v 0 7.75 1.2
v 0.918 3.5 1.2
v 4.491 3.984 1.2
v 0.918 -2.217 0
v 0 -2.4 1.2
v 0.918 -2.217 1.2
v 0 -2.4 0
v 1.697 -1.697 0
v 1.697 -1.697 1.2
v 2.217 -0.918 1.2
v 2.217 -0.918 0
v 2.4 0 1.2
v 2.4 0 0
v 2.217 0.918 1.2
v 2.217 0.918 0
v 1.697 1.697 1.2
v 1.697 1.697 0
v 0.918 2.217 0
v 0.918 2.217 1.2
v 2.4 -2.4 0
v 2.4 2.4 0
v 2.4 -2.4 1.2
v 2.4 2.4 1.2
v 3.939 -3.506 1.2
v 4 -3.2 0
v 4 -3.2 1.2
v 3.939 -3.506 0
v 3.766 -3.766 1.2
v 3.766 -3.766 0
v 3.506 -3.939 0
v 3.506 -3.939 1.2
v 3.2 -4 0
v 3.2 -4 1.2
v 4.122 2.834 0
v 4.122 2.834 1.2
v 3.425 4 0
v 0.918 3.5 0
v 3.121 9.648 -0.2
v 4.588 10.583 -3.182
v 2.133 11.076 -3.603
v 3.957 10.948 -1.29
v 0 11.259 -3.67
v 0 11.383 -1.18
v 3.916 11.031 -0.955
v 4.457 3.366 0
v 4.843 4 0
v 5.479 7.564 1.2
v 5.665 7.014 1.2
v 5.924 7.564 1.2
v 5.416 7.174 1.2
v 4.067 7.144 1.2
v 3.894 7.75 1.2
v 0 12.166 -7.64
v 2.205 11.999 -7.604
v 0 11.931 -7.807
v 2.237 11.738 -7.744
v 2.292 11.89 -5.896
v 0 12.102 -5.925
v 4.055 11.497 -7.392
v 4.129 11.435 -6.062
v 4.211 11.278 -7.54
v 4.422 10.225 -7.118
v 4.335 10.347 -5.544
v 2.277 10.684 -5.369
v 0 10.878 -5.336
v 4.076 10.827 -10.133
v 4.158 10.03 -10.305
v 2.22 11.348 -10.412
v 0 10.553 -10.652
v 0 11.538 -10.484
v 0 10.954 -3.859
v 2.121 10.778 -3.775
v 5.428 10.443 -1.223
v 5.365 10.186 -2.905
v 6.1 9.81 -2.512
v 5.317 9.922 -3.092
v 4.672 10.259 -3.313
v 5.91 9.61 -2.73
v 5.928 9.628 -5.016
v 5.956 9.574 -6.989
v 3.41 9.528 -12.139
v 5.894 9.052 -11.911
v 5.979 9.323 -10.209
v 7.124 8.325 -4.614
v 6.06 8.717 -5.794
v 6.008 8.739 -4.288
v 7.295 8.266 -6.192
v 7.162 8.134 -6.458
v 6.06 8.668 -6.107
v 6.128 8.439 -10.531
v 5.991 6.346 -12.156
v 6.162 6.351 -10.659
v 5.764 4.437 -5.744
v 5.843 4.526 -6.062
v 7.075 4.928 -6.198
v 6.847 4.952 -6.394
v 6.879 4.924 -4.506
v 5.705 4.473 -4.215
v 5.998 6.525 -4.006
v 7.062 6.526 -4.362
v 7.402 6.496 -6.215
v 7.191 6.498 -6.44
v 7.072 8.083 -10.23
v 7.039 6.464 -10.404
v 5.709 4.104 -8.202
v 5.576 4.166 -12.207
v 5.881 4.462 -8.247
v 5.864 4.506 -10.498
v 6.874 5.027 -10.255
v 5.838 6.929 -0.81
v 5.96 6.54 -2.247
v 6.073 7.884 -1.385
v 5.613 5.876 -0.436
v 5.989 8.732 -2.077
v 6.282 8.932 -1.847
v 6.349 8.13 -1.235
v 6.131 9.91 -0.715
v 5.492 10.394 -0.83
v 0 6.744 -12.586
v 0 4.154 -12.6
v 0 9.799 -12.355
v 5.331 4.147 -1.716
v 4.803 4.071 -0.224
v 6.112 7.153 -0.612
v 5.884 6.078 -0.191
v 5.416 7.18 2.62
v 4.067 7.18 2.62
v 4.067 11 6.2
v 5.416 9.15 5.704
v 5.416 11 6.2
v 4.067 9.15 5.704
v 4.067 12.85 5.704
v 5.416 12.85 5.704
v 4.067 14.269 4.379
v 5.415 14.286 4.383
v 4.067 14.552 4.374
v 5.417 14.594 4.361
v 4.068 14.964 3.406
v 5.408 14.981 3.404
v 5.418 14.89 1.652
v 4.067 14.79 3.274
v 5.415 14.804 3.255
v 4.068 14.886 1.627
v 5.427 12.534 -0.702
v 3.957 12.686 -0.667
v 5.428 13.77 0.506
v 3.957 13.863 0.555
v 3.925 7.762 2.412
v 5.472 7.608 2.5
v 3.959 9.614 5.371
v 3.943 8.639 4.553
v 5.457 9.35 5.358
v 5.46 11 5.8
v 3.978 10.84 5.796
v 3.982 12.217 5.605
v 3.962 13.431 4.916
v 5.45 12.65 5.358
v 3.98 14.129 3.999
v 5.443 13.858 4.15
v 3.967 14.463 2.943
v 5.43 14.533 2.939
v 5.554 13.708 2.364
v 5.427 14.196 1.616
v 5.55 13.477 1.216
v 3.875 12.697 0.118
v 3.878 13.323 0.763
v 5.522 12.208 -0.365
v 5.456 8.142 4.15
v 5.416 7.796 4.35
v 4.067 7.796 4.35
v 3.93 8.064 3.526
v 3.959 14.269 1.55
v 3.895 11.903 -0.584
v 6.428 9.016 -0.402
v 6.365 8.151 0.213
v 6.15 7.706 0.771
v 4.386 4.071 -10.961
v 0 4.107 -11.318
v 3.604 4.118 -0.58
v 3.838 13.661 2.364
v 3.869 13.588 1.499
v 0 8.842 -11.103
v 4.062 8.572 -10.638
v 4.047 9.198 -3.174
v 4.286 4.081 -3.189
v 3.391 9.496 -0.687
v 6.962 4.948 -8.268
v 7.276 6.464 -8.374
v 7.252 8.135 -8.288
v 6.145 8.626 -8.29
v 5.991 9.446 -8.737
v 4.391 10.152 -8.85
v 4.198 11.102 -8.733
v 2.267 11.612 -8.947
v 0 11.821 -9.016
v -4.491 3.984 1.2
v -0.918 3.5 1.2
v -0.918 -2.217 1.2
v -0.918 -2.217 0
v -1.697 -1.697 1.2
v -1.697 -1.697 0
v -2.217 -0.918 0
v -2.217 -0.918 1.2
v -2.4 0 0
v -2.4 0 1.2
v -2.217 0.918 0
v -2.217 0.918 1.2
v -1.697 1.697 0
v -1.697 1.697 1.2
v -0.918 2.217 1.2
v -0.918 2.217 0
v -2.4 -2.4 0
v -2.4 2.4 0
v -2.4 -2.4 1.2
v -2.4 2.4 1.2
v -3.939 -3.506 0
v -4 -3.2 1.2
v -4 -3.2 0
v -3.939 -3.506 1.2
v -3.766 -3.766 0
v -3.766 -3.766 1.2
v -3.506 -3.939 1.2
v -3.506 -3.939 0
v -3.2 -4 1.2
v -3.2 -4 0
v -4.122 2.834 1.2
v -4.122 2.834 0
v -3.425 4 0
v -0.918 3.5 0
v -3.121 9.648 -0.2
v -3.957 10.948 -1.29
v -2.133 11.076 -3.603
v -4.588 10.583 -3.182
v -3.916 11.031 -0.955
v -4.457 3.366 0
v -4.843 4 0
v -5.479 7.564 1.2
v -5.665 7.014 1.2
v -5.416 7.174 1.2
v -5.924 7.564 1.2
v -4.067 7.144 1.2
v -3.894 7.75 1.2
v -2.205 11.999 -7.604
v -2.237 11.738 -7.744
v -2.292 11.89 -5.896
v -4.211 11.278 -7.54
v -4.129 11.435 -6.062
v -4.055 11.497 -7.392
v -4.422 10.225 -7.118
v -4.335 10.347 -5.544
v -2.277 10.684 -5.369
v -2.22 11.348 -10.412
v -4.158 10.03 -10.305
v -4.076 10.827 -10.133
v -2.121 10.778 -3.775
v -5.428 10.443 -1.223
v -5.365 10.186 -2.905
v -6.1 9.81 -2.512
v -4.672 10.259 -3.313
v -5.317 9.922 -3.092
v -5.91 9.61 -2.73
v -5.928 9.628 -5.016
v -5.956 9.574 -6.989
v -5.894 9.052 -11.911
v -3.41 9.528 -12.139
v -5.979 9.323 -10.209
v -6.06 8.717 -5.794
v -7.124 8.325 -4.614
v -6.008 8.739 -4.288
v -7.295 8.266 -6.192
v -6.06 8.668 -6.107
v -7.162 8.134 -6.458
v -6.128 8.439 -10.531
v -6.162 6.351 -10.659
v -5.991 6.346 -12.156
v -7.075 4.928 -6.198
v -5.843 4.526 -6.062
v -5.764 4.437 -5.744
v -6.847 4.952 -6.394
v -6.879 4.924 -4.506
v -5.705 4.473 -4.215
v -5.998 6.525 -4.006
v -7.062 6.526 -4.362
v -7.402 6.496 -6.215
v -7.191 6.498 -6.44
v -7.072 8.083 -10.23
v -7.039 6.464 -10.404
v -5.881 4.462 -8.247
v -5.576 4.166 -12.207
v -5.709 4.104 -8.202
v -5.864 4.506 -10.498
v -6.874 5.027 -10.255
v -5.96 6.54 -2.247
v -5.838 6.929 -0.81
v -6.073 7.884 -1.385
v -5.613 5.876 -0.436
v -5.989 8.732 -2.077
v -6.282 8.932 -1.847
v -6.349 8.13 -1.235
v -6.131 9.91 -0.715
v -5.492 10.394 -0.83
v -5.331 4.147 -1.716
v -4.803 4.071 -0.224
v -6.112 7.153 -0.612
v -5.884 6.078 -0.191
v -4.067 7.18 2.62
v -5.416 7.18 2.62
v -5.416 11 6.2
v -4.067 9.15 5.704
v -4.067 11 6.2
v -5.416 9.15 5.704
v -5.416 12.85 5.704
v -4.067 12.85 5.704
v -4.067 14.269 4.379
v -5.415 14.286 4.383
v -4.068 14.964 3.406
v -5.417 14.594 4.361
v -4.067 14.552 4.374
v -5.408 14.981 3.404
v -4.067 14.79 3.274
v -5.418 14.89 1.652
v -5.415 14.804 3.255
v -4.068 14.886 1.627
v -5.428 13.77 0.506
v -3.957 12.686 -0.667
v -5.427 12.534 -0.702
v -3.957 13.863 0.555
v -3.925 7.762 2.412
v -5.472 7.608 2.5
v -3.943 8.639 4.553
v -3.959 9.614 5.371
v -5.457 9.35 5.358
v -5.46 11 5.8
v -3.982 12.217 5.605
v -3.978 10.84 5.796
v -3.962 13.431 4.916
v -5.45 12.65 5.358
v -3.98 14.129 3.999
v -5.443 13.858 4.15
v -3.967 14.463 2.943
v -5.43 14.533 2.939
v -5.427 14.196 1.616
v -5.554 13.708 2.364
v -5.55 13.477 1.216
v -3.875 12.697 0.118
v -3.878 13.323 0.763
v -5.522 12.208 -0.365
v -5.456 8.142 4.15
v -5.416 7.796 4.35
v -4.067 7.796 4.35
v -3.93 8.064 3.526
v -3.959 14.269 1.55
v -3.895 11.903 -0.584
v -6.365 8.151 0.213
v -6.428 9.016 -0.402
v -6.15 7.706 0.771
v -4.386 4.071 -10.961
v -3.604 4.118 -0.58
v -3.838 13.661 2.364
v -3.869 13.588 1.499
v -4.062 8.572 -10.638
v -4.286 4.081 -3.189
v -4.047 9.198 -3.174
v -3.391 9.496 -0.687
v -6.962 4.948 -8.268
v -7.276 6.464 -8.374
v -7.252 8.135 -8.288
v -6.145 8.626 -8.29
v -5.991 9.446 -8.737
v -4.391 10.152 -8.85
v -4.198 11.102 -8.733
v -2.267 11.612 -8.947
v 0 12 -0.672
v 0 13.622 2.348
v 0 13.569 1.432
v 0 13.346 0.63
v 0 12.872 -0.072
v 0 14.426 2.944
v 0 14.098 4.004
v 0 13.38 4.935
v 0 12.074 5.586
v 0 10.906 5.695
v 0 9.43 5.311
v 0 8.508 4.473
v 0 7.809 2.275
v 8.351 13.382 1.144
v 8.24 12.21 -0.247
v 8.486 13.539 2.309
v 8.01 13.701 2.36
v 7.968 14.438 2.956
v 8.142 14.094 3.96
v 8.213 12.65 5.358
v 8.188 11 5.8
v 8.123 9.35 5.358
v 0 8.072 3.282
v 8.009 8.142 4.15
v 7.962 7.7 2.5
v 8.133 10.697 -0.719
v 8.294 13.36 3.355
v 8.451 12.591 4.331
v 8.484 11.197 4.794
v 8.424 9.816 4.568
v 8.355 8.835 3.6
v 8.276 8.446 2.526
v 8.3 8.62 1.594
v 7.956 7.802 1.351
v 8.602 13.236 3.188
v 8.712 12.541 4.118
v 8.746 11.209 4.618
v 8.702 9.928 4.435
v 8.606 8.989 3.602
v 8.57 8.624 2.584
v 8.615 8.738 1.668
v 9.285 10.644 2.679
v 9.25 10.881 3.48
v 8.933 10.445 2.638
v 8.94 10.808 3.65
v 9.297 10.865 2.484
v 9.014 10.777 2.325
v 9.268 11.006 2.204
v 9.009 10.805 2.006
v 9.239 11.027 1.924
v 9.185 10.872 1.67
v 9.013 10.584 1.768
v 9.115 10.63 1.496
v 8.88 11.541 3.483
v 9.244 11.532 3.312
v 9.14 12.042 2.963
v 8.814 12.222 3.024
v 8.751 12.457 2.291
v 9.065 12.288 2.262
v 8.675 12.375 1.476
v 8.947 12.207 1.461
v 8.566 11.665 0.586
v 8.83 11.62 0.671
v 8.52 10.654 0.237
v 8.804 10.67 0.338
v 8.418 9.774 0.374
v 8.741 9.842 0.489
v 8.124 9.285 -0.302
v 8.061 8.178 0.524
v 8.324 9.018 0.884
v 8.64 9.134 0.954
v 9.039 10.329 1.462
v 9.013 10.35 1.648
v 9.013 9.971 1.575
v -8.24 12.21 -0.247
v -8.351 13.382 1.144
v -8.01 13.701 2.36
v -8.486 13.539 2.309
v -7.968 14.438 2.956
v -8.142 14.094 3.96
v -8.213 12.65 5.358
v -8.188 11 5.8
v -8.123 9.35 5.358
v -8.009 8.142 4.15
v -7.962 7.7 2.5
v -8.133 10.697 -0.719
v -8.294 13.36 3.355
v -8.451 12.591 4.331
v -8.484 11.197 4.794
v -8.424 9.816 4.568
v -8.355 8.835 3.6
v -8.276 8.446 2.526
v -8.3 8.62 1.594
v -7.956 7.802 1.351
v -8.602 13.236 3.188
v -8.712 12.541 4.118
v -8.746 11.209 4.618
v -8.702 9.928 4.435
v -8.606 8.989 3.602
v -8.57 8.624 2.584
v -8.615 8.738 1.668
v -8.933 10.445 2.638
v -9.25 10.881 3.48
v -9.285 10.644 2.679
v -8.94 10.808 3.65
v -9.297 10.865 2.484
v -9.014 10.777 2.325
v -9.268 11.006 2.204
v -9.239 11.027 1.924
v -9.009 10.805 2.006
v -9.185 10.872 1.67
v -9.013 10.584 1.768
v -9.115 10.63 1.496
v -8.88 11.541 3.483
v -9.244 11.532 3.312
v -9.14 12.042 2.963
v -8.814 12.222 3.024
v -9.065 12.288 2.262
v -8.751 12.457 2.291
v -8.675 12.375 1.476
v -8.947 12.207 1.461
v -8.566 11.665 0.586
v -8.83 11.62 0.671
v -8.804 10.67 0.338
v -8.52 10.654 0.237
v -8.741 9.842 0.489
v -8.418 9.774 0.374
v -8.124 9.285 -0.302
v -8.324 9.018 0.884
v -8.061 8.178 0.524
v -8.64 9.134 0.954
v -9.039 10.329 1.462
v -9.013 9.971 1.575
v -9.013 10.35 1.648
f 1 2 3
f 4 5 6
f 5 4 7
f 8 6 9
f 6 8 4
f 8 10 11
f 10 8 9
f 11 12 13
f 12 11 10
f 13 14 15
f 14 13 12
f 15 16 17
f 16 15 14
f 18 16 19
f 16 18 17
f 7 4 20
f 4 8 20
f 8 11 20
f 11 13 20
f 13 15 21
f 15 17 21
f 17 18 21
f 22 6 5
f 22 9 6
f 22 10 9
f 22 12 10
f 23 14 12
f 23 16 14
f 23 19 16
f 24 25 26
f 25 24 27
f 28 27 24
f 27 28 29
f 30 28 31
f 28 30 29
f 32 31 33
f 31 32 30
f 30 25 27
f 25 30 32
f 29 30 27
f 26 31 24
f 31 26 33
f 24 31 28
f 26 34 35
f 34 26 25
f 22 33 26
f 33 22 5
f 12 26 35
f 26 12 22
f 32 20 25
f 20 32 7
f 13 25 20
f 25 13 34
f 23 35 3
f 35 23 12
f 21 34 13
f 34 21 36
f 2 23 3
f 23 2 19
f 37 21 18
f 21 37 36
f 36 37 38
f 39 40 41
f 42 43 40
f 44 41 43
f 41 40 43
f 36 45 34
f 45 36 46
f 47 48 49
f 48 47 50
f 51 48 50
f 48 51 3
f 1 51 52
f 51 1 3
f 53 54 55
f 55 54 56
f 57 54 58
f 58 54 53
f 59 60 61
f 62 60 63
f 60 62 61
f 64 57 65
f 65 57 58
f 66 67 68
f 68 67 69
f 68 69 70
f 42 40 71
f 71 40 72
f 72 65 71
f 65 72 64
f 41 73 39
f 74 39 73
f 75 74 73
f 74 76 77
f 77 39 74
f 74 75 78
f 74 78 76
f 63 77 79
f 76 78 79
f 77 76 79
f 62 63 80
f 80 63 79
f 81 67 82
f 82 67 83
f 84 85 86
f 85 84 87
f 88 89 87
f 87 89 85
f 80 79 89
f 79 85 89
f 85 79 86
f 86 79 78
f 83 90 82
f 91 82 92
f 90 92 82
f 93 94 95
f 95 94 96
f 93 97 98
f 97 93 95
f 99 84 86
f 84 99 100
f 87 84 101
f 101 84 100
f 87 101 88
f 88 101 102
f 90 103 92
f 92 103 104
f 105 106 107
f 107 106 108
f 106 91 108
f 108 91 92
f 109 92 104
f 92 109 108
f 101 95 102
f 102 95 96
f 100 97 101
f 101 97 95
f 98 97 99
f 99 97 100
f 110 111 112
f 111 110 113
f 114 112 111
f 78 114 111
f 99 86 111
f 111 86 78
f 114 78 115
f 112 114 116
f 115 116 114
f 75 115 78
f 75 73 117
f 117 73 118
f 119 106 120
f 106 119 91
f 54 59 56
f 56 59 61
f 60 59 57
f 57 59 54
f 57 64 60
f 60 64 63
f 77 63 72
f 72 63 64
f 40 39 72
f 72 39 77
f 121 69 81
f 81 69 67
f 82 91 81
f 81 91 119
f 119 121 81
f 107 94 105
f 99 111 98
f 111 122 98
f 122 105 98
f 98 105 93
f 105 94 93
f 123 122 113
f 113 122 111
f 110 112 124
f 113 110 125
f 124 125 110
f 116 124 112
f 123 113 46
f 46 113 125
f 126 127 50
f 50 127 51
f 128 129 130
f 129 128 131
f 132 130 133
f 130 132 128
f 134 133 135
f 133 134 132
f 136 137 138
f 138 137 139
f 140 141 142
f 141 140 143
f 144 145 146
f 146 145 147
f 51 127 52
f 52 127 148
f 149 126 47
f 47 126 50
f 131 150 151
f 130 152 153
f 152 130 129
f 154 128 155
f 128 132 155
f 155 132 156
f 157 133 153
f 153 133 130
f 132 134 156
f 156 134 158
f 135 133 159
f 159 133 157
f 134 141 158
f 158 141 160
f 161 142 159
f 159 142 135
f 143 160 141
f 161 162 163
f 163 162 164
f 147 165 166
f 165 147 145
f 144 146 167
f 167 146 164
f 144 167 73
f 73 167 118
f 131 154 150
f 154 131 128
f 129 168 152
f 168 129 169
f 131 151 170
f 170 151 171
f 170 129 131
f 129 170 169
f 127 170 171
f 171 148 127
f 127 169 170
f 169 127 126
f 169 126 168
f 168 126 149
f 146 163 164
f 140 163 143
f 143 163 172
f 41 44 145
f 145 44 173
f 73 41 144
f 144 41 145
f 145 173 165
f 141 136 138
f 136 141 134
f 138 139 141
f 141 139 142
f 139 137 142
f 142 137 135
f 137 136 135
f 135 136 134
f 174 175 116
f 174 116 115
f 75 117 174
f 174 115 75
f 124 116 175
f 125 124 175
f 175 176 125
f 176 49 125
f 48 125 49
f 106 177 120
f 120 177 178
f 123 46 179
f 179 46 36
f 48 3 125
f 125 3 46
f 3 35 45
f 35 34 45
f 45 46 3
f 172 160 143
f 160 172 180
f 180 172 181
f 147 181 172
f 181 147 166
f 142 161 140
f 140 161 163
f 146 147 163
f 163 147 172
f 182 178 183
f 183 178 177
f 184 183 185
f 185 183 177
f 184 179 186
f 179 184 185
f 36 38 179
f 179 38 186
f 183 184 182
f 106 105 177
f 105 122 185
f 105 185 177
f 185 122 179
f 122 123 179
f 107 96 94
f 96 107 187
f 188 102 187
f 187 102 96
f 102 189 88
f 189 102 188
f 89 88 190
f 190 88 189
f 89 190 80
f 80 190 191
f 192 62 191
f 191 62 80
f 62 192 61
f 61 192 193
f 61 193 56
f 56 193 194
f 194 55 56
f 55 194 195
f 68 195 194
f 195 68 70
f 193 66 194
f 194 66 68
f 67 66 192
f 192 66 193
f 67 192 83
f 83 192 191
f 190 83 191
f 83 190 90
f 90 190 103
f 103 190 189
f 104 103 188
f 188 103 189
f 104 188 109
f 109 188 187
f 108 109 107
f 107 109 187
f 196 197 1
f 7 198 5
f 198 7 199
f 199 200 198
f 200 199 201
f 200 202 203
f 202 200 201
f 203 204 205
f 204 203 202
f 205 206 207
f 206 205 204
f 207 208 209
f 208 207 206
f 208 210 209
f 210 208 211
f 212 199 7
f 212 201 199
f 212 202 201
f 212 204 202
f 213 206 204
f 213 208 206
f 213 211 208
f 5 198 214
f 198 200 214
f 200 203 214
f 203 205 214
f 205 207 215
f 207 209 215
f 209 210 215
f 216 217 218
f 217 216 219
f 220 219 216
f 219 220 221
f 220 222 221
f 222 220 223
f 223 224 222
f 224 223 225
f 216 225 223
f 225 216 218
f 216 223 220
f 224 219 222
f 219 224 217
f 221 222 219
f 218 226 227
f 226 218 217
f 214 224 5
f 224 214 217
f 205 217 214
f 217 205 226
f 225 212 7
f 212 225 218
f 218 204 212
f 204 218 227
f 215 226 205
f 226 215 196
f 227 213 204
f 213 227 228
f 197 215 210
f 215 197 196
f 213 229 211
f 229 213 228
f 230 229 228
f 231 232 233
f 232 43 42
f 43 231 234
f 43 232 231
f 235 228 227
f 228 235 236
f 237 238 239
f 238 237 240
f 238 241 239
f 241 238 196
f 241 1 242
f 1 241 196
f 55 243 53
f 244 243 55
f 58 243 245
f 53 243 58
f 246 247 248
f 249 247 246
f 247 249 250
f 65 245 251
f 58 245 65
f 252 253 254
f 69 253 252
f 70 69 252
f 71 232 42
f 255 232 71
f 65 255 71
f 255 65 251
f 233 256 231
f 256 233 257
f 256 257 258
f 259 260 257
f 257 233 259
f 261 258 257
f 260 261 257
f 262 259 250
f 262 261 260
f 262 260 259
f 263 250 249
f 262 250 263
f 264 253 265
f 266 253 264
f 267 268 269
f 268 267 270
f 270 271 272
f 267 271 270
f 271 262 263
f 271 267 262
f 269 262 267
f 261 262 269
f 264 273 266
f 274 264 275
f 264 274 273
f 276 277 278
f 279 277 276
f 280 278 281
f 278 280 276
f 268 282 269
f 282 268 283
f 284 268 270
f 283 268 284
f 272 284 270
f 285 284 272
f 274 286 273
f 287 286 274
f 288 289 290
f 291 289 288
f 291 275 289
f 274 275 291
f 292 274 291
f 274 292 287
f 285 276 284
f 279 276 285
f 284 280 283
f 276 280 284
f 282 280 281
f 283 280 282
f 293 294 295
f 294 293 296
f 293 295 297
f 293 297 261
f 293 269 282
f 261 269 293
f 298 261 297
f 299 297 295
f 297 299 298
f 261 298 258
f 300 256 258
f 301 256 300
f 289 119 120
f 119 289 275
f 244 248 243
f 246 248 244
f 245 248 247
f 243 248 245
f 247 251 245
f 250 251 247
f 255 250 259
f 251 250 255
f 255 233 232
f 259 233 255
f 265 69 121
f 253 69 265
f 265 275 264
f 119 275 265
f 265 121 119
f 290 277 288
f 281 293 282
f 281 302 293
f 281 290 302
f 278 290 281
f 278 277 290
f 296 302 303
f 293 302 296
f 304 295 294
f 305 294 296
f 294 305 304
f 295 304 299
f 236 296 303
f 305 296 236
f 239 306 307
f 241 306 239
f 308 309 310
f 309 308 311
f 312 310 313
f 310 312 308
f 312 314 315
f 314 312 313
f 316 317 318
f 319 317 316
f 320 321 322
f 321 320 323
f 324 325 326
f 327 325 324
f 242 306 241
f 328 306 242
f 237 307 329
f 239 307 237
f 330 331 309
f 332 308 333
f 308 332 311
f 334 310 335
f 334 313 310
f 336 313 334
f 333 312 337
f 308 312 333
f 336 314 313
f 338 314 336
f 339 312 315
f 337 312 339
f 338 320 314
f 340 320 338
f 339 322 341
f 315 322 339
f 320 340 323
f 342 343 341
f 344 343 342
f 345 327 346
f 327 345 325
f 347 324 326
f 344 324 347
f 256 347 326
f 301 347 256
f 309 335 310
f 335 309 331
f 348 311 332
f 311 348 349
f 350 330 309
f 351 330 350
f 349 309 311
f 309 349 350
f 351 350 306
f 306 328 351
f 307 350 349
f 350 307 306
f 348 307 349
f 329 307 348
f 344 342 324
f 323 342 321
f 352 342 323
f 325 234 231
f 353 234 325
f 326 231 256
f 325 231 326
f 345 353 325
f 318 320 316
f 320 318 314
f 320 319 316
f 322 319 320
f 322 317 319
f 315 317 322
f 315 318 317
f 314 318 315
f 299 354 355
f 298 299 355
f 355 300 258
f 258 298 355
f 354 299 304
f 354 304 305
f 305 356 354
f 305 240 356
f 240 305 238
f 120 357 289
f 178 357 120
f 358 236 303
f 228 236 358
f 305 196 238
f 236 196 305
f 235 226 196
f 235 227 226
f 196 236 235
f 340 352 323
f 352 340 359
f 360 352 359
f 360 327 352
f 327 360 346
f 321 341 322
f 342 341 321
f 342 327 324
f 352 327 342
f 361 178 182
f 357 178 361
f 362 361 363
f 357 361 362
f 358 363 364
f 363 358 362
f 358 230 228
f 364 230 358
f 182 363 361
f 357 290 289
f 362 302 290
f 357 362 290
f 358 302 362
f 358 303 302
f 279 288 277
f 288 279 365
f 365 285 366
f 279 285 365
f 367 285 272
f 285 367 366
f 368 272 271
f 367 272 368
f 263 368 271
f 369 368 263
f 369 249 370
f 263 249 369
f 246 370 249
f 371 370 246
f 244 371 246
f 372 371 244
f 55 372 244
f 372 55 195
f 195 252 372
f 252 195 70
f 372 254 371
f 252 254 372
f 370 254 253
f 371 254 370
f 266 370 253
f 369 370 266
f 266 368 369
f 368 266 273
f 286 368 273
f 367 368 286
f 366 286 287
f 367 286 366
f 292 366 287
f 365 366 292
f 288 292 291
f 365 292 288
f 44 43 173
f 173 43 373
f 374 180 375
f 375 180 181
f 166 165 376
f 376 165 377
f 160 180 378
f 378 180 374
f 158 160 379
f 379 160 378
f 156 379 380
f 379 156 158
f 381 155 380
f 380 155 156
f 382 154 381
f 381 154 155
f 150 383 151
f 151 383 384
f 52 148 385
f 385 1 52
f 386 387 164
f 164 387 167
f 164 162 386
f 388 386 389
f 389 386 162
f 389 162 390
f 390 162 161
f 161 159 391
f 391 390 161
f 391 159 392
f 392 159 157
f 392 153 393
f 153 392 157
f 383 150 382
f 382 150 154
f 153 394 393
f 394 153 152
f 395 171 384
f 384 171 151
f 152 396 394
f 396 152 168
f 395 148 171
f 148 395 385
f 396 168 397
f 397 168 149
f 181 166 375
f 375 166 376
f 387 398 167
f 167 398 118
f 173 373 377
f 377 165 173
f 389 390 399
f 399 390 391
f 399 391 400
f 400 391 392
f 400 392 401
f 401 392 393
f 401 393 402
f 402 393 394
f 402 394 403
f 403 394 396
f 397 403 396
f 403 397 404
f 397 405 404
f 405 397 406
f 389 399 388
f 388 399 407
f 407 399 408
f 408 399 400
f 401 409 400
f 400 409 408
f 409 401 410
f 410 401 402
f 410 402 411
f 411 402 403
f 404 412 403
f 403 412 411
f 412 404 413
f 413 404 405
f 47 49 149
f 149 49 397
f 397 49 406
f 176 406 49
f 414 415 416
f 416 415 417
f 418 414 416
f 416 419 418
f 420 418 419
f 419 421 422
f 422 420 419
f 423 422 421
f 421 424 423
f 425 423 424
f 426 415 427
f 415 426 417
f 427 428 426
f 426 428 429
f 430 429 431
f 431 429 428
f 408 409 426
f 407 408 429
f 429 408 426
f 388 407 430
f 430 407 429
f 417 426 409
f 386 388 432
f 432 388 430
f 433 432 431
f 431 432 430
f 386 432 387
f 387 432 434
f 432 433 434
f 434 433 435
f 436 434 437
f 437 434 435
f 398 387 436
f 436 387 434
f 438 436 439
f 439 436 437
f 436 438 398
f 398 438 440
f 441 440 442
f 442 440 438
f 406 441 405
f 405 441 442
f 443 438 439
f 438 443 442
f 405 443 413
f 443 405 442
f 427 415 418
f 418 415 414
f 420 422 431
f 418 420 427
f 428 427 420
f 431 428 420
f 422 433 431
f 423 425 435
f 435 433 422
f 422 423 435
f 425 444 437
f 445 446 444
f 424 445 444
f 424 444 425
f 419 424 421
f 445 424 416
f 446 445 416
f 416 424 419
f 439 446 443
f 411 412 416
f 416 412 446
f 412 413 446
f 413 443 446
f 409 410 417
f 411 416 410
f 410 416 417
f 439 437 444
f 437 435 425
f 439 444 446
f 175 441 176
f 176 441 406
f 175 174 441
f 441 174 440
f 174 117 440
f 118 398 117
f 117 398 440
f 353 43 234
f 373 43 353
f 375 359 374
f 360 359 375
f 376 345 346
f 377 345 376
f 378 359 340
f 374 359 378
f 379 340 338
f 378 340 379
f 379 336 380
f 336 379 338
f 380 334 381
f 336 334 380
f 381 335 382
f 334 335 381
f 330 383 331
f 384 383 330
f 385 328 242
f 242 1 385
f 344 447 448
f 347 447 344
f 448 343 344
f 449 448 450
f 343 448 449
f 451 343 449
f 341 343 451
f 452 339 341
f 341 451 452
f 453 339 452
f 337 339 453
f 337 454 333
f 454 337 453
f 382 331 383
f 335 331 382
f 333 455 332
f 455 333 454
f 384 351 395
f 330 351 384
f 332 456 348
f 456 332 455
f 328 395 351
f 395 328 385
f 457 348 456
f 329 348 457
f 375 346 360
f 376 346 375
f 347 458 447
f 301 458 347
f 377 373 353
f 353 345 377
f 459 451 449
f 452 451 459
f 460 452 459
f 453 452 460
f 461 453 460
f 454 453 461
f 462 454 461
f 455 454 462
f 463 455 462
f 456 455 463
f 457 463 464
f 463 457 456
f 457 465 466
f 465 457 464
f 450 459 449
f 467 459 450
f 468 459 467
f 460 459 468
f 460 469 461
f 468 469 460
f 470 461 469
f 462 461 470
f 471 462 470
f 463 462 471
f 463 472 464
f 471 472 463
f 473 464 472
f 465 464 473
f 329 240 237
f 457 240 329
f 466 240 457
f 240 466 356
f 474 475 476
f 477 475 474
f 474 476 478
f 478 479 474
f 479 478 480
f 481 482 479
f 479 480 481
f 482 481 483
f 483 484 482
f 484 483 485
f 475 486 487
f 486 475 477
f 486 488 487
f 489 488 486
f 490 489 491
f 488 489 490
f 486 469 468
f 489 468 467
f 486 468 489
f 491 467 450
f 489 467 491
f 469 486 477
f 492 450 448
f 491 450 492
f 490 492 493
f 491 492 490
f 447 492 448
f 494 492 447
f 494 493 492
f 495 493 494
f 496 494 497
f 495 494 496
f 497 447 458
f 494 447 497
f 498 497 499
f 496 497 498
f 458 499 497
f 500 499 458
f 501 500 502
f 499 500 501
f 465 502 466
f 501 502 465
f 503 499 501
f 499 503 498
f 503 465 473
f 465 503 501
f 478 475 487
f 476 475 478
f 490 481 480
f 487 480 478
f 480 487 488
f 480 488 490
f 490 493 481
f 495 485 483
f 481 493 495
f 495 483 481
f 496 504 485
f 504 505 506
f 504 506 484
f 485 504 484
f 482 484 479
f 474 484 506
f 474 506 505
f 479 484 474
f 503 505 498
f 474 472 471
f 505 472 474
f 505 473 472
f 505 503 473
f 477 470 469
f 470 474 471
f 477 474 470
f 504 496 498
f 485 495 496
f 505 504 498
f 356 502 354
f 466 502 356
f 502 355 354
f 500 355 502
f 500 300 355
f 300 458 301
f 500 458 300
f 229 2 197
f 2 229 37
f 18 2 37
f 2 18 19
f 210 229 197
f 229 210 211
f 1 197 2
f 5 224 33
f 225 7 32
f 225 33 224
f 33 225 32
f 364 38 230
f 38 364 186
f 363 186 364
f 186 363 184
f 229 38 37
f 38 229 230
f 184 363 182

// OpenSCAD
use <../lib.scad>
use <../p/box3u2p.scad>
use <../p/rect2p.scad>
use <s/26073s01.scad>
use <s/26073s02.scad>
function ldraw_lib__26073p01() = [
// 0 Minifig Backpack with Three Pouches and Red Bedroll Pattern
// 0 Name: 26073p01.dat
// 0 Author: Gerald Lasser [GeraldLasser]
// 0 !LDRAW_ORG Part UPDATE 2022-04
// 0 !LICENSE Licensed under CC BY 4.0 : see CAreadme.txt
// 
// 0 BFC CERTIFY CCW
  [0,"BFC","CERTIFY"],
  [0,"BFC","CCW"],
// 
// 0 !CATEGORY Minifig Neckwear
// 0 !KEYWORDS BrickLink 26073pb02, Rebrickable 26073pr0002, Set 71019-10
// 
// 0 !HISTORY 2022-07-18 [PTadmin] Official Update 2022-04
// 
// 
// 1 16 0 0 0 1 0 0 0 1 0 0 0 1 s\26073s01.dat
  [1,16,0,0,0,1,0,0,0,1,0,0,0,1, ldraw_lib__s__26073s01()],
// 1 16 0 0 0 -1 0 0 0 1 0 0 0 1 s\26073s01.dat
  [1,16,0,0,0,-1,0,0,0,1,0,0,0,1, ldraw_lib__s__26073s01()],
// 1 4 0 0 0 1 0 0 0 1 0 0 0 1 s\26073s02.dat
  [1,4,0,0,0,1,0,0,0,1,0,0,0,1, ldraw_lib__s__26073s02()],
// 1 4 0 0 0 -1 0 0 0 1 0 0 0 1 s\26073s02.dat
  [1,4,0,0,0,-1,0,0,0,1,0,0,0,1, ldraw_lib__s__26073s02()],
// 
// 0 BFC INVERTNEXT
  [0,"BFC","INVERTNEXT"],
// 1 16 0 -1.5 5.5434 0 0 2.2962 1.5 0 0 0 3.2066 0 box3u2p.dat
  [1,16,0,-1.5,5.5434,0,0,2.2962,1.5,0,0,0,3.2066,0, ldraw_lib__box3u2p()],
// 3 16 0 -3 19.374 -2.2962 -3 8.75 2.2962 -3 8.75
  [3,16,0,-3,19.374,-2.2962,-3,8.75,2.2962,-3,8.75],
// 3 16 0 -3 -6 -8 -3 -10 8 -3 -10
  [3,16,0,-3,-6,-8,-3,-10,8,-3,-10],
// 3 16 -8 0 -10 0 0 -6 8 0 -10
  [3,16,-8,0,-10,0,0,-6,8,0,-10],
// 1 16 0 -1.5 -10 -8 0 0 0 0 1.5 0 1 0 rect2p.dat
  [1,16,0,-1.5,-10,-8,0,0,0,0,1.5,0,1,0, ldraw_lib__rect2p()],
// 2 24 7.802 .499 24.119 -7.802 .499 24.119
  [2,24,7.802,.499,24.119,-7.802,.499,24.119],
// 
// 4 16 7.802 .499 24.119 -7.802 .499 24.119 -8.477 1.717 23.739 8.477 1.717 23.739
  [4,16,7.802,.499,24.119,-7.802,.499,24.119,-8.477,1.717,23.739,8.477,1.717,23.739],
// 4 16 10.117 7.934 22.995 8.477 1.717 23.739 -8.477 1.717 23.739 -10.117 7.934 22.995
  [4,16,10.117,7.934,22.995,8.477,1.717,23.739,-8.477,1.717,23.739,-10.117,7.934,22.995],
// 4 16 2.2962 0 8.75 -2.2962 0 8.75 -7.802 .499 24.119 7.802 .499 24.119
  [4,16,2.2962,0,8.75,-2.2962,0,8.75,-7.802,.499,24.119,7.802,.499,24.119],
// 3 16 10.117 7.934 22.995 -10.117 7.934 22.995 0 27.758 22.106
  [3,16,10.117,7.934,22.995,-10.117,7.934,22.995,0,27.758,22.106],
// 5 24 8.477 1.717 23.739 -8.477 1.717 23.739 7.802 .499 24.119 10.117 7.934 22.995
  [5,24,8.477,1.717,23.739,-8.477,1.717,23.739,7.802,.499,24.119,10.117,7.934,22.995],
// 5 24 -10.117 7.934 22.995 10.117 7.934 22.995 8.477 1.717 23.739 10.156 26.595 21.431
  [5,24,-10.117,7.934,22.995,10.117,7.934,22.995,8.477,1.717,23.739,10.156,26.595,21.431],
// 5 24 10.117 7.934 22.995 0 27.758 22.106 10.156 26.595 21.431 -10.117 7.934 22.995
  [5,24,10.117,7.934,22.995,0,27.758,22.106,10.156,26.595,21.431,-10.117,7.934,22.995],
// 5 24 0 27.758 22.106 -10.117 7.934 22.995 10.117 7.934 22.995 -10.156 26.595 21.431
  [5,24,0,27.758,22.106,-10.117,7.934,22.995,10.117,7.934,22.995,-10.156,26.595,21.431],
// 
// 0 // Seam
// 5 24 0 31.466 16.86 0 31.501 10.384 -14.977 30.389 15.864 13.94 30.517 10.414
  [5,24,0,31.466,16.86,0,31.501,10.384,-14.977,30.389,15.864,13.94,30.517,10.414],
// 5 24 0 30.888 24.497 0 31.466 16.86 8.525 30.348 23.819 -8.525 30.348 23.819
  [5,24,0,30.888,24.497,0,31.466,16.86,8.525,30.348,23.819,-8.525,30.348,23.819],
// 5 24 0 26.629 26.383 0 30.888 24.497 8.525 30.348 23.819 -8.525 30.348 23.819
  [5,24,0,26.629,26.383,0,30.888,24.497,8.525,30.348,23.819,-8.525,30.348,23.819],
// 5 24 0 26.629 26.383 0 26.211 28.844 5.549 26.03 28.371 -5.549 26.03 28.371
  [5,24,0,26.629,26.383,0,26.211,28.844,5.549,26.03,28.371,-5.549,26.03,28.371],
// 5 24 0 22.541 29.553 0 26.211 28.844 -5.667 22.367 29.03 5.549 26.03 28.371
  [5,24,0,22.541,29.553,0,26.211,28.844,-5.667,22.367,29.03,5.549,26.03,28.371],
// 5 24 0 22.541 29.553 0 19.518 29.827 -5.667 22.367 29.03 5.592 19.361 29.344
  [5,24,0,22.541,29.553,0,19.518,29.827,-5.667,22.367,29.03,5.592,19.361,29.344],
// 5 24 0 19.518 29.827 0 19.101 30.416 -5.512 19.01 29.997 5.512 19.01 29.997
  [5,24,0,19.518,29.827,0,19.101,30.416,-5.512,19.01,29.997,5.512,19.01,29.997],
// 5 24 0 14.812 30.254 0 19.101 30.416 5.512 19.01 29.997 -5.512 19.01 29.997
  [5,24,0,14.812,30.254,0,19.101,30.416,5.512,19.01,29.997,-5.512,19.01,29.997],
// 5 24 0 13.34 27.194 0 14.812 30.254 5.731 14.739 29.726 -5.731 14.739 29.726
  [5,24,0,13.34,27.194,0,14.812,30.254,5.731,14.739,29.726,-5.731,14.739,29.726],
// 5 24 0 13.34 27.194 0 9.647 27.386 5.303 9.437 26.946 -5.693 13.422 26.709
  [5,24,0,13.34,27.194,0,9.647,27.386,5.303,9.437,26.946,-5.693,13.422,26.709],
// 5 24 0 9.647 27.386 0 9.174 28.147 5.332 9.008 27.69 -5.332 9.008 27.69
  [5,24,0,9.647,27.386,0,9.174,28.147,5.332,9.008,27.69,-5.332,9.008,27.69],
// 5 24 0 9.174 28.147 0 2.95 28.458 -5.332 9.008 27.69 5.332 9.008 27.69
  [5,24,0,9.174,28.147,0,2.95,28.458,-5.332,9.008,27.69,5.332,9.008,27.69],
// 5 24 0 1.68 29.999 0 2.95 28.458 -9.738 1.231 29.578 9.738 1.231 29.578
  [5,24,0,1.68,29.999,0,2.95,28.458,-9.738,1.231,29.578,9.738,1.231,29.578],
// 5 24 0 .179 32.18 0 1.68 29.999 9.687 -.296 31.742 -9.738 1.231 29.578
  [5,24,0,.179,32.18,0,1.68,29.999,9.687,-.296,31.742,-9.738,1.231,29.578],
// 5 24 0 -1.576 33.365 0 .179 32.18 9.687 -.296 31.742 -9.687 -.296 31.742
  [5,24,0,-1.576,33.365,0,.179,32.18,9.687,-.296,31.742,-9.687,-.296,31.742],
// 5 24 0 -3.579 33.922 0 -1.576 33.365 9.696 -1.907 33.307 -9.696 -1.907 33.307
  [5,24,0,-3.579,33.922,0,-1.576,33.365,9.696,-1.907,33.307,-9.696,-1.907,33.307],
// 5 24 0 -3.579 33.922 0 -5.871 34.055 9.594 -5.911 34.153 -9.594 -5.911 34.153
  [5,24,0,-3.579,33.922,0,-5.871,34.055,9.594,-5.911,34.153,-9.594,-5.911,34.153],
// 5 24 0 -5.871 34.055 0 -7.36 36.065 9.594 -5.911 34.153 -9.594 -5.911 34.153
  [5,24,0,-5.871,34.055,0,-7.36,36.065,9.594,-5.911,34.153,-9.594,-5.911,34.153],
// 5 24 0 -10.009 35.245 0 -7.36 36.065 9.918 -7.358 36.157 -9.918 -7.358 36.157
  [5,24,0,-10.009,35.245,0,-7.36,36.065,9.918,-7.358,36.157,-9.918,-7.358,36.157],
// 5 24 0 -12.337 33.451 0 -10.009 35.245 9.904 -12.291 33.578 -9.95 -9.997 35.323
  [5,24,0,-12.337,33.451,0,-10.009,35.245,9.904,-12.291,33.578,-9.95,-9.997,35.323],
// 5 24 0 -13.966 30.184 0 -12.337 33.451 9.956 -14.012 30.543 -9.956 -14.012 30.543
  [5,24,0,-13.966,30.184,0,-12.337,33.451,9.956,-14.012,30.543,-9.956,-14.012,30.543],
// 5 24 0 -14.238 27.264 0 -13.966 30.184 -9.946 -14.489 27.1 9.946 -14.489 27.1
  [5,24,0,-14.238,27.264,0,-13.966,30.184,-9.946,-14.489,27.1,9.946,-14.489,27.1],
// 5 24 0 -5.688 19.523 0 -3 19.374 -9.812 -6.029 19.404 9.735 -3 19.374
  [5,24,0,-5.688,19.523,0,-3,19.374,-9.812,-6.029,19.404,9.735,-3,19.374],
// 5 24 0 -5.688 19.523 0 -8.205 20.18 -9.825 -8.814 20.16 9.812 -6.029 19.404
  [5,24,0,-5.688,19.523,0,-8.205,20.18,-9.825,-8.814,20.16,9.812,-6.029,19.404],
// 5 24 0 -8.205 20.18 0 -11.183 21.269 -9.825 -8.814 20.16 9.825 -8.814 20.16
  [5,24,0,-8.205,20.18,0,-11.183,21.269,-9.825,-8.814,20.16,9.825,-8.814,20.16],
// 5 24 0 -11.183 21.269 0 -13.278 23.574 -9.857 -11.382 21.598 9.857 -11.382 21.598
  [5,24,0,-11.183,21.269,0,-13.278,23.574,-9.857,-11.382,21.598,9.857,-11.382,21.598],
// 5 24 0 -13.278 23.574 0 -14.238 27.264 9.897 -13.428 24.034 -9.897 -13.428 24.034
  [5,24,0,-13.278,23.574,0,-14.238,27.264,9.897,-13.428,24.034,-9.897,-13.428,24.034],
// 5 24 0 28.295 10.267 0 31.501 10.384 10.966 27.403 10.178 -10.966 27.403 10.178
  [5,24,0,28.295,10.267,0,31.501,10.384,10.966,27.403,10.178,-10.966,27.403,10.178],
// 5 24 0 27.758 22.106 0 28.295 10.267 -10.156 26.595 21.431 10.156 26.595 21.431
  [5,24,0,27.758,22.106,0,28.295,10.267,-10.156,26.595,21.431,10.156,26.595,21.431],
// 
// 5 24 -7.802 .499 24.119 -2.2962 0 8.75 -8.563 0 10 7.802 .499 24.119
  [5,24,-7.802,.499,24.119,-2.2962,0,8.75,-8.563,0,10,7.802,.499,24.119],
// 5 24 7.802 .499 24.119 2.2962 0 8.75 -7.802 .499 24.119 8.563 0 10
  [5,24,7.802,.499,24.119,2.2962,0,8.75,-7.802,.499,24.119,8.563,0,10],
];
module ldraw_lib__26073p01(step=0, col=false, unit=2/5, alt=false, line=0.2, solid=!$preview)
    makepoly(ldraw_lib__26073p01(), step=step, col=col, unit=unit, alt=alt, line=line, solid=solid);
ldraw_lib__26073p01(line=0.2);
